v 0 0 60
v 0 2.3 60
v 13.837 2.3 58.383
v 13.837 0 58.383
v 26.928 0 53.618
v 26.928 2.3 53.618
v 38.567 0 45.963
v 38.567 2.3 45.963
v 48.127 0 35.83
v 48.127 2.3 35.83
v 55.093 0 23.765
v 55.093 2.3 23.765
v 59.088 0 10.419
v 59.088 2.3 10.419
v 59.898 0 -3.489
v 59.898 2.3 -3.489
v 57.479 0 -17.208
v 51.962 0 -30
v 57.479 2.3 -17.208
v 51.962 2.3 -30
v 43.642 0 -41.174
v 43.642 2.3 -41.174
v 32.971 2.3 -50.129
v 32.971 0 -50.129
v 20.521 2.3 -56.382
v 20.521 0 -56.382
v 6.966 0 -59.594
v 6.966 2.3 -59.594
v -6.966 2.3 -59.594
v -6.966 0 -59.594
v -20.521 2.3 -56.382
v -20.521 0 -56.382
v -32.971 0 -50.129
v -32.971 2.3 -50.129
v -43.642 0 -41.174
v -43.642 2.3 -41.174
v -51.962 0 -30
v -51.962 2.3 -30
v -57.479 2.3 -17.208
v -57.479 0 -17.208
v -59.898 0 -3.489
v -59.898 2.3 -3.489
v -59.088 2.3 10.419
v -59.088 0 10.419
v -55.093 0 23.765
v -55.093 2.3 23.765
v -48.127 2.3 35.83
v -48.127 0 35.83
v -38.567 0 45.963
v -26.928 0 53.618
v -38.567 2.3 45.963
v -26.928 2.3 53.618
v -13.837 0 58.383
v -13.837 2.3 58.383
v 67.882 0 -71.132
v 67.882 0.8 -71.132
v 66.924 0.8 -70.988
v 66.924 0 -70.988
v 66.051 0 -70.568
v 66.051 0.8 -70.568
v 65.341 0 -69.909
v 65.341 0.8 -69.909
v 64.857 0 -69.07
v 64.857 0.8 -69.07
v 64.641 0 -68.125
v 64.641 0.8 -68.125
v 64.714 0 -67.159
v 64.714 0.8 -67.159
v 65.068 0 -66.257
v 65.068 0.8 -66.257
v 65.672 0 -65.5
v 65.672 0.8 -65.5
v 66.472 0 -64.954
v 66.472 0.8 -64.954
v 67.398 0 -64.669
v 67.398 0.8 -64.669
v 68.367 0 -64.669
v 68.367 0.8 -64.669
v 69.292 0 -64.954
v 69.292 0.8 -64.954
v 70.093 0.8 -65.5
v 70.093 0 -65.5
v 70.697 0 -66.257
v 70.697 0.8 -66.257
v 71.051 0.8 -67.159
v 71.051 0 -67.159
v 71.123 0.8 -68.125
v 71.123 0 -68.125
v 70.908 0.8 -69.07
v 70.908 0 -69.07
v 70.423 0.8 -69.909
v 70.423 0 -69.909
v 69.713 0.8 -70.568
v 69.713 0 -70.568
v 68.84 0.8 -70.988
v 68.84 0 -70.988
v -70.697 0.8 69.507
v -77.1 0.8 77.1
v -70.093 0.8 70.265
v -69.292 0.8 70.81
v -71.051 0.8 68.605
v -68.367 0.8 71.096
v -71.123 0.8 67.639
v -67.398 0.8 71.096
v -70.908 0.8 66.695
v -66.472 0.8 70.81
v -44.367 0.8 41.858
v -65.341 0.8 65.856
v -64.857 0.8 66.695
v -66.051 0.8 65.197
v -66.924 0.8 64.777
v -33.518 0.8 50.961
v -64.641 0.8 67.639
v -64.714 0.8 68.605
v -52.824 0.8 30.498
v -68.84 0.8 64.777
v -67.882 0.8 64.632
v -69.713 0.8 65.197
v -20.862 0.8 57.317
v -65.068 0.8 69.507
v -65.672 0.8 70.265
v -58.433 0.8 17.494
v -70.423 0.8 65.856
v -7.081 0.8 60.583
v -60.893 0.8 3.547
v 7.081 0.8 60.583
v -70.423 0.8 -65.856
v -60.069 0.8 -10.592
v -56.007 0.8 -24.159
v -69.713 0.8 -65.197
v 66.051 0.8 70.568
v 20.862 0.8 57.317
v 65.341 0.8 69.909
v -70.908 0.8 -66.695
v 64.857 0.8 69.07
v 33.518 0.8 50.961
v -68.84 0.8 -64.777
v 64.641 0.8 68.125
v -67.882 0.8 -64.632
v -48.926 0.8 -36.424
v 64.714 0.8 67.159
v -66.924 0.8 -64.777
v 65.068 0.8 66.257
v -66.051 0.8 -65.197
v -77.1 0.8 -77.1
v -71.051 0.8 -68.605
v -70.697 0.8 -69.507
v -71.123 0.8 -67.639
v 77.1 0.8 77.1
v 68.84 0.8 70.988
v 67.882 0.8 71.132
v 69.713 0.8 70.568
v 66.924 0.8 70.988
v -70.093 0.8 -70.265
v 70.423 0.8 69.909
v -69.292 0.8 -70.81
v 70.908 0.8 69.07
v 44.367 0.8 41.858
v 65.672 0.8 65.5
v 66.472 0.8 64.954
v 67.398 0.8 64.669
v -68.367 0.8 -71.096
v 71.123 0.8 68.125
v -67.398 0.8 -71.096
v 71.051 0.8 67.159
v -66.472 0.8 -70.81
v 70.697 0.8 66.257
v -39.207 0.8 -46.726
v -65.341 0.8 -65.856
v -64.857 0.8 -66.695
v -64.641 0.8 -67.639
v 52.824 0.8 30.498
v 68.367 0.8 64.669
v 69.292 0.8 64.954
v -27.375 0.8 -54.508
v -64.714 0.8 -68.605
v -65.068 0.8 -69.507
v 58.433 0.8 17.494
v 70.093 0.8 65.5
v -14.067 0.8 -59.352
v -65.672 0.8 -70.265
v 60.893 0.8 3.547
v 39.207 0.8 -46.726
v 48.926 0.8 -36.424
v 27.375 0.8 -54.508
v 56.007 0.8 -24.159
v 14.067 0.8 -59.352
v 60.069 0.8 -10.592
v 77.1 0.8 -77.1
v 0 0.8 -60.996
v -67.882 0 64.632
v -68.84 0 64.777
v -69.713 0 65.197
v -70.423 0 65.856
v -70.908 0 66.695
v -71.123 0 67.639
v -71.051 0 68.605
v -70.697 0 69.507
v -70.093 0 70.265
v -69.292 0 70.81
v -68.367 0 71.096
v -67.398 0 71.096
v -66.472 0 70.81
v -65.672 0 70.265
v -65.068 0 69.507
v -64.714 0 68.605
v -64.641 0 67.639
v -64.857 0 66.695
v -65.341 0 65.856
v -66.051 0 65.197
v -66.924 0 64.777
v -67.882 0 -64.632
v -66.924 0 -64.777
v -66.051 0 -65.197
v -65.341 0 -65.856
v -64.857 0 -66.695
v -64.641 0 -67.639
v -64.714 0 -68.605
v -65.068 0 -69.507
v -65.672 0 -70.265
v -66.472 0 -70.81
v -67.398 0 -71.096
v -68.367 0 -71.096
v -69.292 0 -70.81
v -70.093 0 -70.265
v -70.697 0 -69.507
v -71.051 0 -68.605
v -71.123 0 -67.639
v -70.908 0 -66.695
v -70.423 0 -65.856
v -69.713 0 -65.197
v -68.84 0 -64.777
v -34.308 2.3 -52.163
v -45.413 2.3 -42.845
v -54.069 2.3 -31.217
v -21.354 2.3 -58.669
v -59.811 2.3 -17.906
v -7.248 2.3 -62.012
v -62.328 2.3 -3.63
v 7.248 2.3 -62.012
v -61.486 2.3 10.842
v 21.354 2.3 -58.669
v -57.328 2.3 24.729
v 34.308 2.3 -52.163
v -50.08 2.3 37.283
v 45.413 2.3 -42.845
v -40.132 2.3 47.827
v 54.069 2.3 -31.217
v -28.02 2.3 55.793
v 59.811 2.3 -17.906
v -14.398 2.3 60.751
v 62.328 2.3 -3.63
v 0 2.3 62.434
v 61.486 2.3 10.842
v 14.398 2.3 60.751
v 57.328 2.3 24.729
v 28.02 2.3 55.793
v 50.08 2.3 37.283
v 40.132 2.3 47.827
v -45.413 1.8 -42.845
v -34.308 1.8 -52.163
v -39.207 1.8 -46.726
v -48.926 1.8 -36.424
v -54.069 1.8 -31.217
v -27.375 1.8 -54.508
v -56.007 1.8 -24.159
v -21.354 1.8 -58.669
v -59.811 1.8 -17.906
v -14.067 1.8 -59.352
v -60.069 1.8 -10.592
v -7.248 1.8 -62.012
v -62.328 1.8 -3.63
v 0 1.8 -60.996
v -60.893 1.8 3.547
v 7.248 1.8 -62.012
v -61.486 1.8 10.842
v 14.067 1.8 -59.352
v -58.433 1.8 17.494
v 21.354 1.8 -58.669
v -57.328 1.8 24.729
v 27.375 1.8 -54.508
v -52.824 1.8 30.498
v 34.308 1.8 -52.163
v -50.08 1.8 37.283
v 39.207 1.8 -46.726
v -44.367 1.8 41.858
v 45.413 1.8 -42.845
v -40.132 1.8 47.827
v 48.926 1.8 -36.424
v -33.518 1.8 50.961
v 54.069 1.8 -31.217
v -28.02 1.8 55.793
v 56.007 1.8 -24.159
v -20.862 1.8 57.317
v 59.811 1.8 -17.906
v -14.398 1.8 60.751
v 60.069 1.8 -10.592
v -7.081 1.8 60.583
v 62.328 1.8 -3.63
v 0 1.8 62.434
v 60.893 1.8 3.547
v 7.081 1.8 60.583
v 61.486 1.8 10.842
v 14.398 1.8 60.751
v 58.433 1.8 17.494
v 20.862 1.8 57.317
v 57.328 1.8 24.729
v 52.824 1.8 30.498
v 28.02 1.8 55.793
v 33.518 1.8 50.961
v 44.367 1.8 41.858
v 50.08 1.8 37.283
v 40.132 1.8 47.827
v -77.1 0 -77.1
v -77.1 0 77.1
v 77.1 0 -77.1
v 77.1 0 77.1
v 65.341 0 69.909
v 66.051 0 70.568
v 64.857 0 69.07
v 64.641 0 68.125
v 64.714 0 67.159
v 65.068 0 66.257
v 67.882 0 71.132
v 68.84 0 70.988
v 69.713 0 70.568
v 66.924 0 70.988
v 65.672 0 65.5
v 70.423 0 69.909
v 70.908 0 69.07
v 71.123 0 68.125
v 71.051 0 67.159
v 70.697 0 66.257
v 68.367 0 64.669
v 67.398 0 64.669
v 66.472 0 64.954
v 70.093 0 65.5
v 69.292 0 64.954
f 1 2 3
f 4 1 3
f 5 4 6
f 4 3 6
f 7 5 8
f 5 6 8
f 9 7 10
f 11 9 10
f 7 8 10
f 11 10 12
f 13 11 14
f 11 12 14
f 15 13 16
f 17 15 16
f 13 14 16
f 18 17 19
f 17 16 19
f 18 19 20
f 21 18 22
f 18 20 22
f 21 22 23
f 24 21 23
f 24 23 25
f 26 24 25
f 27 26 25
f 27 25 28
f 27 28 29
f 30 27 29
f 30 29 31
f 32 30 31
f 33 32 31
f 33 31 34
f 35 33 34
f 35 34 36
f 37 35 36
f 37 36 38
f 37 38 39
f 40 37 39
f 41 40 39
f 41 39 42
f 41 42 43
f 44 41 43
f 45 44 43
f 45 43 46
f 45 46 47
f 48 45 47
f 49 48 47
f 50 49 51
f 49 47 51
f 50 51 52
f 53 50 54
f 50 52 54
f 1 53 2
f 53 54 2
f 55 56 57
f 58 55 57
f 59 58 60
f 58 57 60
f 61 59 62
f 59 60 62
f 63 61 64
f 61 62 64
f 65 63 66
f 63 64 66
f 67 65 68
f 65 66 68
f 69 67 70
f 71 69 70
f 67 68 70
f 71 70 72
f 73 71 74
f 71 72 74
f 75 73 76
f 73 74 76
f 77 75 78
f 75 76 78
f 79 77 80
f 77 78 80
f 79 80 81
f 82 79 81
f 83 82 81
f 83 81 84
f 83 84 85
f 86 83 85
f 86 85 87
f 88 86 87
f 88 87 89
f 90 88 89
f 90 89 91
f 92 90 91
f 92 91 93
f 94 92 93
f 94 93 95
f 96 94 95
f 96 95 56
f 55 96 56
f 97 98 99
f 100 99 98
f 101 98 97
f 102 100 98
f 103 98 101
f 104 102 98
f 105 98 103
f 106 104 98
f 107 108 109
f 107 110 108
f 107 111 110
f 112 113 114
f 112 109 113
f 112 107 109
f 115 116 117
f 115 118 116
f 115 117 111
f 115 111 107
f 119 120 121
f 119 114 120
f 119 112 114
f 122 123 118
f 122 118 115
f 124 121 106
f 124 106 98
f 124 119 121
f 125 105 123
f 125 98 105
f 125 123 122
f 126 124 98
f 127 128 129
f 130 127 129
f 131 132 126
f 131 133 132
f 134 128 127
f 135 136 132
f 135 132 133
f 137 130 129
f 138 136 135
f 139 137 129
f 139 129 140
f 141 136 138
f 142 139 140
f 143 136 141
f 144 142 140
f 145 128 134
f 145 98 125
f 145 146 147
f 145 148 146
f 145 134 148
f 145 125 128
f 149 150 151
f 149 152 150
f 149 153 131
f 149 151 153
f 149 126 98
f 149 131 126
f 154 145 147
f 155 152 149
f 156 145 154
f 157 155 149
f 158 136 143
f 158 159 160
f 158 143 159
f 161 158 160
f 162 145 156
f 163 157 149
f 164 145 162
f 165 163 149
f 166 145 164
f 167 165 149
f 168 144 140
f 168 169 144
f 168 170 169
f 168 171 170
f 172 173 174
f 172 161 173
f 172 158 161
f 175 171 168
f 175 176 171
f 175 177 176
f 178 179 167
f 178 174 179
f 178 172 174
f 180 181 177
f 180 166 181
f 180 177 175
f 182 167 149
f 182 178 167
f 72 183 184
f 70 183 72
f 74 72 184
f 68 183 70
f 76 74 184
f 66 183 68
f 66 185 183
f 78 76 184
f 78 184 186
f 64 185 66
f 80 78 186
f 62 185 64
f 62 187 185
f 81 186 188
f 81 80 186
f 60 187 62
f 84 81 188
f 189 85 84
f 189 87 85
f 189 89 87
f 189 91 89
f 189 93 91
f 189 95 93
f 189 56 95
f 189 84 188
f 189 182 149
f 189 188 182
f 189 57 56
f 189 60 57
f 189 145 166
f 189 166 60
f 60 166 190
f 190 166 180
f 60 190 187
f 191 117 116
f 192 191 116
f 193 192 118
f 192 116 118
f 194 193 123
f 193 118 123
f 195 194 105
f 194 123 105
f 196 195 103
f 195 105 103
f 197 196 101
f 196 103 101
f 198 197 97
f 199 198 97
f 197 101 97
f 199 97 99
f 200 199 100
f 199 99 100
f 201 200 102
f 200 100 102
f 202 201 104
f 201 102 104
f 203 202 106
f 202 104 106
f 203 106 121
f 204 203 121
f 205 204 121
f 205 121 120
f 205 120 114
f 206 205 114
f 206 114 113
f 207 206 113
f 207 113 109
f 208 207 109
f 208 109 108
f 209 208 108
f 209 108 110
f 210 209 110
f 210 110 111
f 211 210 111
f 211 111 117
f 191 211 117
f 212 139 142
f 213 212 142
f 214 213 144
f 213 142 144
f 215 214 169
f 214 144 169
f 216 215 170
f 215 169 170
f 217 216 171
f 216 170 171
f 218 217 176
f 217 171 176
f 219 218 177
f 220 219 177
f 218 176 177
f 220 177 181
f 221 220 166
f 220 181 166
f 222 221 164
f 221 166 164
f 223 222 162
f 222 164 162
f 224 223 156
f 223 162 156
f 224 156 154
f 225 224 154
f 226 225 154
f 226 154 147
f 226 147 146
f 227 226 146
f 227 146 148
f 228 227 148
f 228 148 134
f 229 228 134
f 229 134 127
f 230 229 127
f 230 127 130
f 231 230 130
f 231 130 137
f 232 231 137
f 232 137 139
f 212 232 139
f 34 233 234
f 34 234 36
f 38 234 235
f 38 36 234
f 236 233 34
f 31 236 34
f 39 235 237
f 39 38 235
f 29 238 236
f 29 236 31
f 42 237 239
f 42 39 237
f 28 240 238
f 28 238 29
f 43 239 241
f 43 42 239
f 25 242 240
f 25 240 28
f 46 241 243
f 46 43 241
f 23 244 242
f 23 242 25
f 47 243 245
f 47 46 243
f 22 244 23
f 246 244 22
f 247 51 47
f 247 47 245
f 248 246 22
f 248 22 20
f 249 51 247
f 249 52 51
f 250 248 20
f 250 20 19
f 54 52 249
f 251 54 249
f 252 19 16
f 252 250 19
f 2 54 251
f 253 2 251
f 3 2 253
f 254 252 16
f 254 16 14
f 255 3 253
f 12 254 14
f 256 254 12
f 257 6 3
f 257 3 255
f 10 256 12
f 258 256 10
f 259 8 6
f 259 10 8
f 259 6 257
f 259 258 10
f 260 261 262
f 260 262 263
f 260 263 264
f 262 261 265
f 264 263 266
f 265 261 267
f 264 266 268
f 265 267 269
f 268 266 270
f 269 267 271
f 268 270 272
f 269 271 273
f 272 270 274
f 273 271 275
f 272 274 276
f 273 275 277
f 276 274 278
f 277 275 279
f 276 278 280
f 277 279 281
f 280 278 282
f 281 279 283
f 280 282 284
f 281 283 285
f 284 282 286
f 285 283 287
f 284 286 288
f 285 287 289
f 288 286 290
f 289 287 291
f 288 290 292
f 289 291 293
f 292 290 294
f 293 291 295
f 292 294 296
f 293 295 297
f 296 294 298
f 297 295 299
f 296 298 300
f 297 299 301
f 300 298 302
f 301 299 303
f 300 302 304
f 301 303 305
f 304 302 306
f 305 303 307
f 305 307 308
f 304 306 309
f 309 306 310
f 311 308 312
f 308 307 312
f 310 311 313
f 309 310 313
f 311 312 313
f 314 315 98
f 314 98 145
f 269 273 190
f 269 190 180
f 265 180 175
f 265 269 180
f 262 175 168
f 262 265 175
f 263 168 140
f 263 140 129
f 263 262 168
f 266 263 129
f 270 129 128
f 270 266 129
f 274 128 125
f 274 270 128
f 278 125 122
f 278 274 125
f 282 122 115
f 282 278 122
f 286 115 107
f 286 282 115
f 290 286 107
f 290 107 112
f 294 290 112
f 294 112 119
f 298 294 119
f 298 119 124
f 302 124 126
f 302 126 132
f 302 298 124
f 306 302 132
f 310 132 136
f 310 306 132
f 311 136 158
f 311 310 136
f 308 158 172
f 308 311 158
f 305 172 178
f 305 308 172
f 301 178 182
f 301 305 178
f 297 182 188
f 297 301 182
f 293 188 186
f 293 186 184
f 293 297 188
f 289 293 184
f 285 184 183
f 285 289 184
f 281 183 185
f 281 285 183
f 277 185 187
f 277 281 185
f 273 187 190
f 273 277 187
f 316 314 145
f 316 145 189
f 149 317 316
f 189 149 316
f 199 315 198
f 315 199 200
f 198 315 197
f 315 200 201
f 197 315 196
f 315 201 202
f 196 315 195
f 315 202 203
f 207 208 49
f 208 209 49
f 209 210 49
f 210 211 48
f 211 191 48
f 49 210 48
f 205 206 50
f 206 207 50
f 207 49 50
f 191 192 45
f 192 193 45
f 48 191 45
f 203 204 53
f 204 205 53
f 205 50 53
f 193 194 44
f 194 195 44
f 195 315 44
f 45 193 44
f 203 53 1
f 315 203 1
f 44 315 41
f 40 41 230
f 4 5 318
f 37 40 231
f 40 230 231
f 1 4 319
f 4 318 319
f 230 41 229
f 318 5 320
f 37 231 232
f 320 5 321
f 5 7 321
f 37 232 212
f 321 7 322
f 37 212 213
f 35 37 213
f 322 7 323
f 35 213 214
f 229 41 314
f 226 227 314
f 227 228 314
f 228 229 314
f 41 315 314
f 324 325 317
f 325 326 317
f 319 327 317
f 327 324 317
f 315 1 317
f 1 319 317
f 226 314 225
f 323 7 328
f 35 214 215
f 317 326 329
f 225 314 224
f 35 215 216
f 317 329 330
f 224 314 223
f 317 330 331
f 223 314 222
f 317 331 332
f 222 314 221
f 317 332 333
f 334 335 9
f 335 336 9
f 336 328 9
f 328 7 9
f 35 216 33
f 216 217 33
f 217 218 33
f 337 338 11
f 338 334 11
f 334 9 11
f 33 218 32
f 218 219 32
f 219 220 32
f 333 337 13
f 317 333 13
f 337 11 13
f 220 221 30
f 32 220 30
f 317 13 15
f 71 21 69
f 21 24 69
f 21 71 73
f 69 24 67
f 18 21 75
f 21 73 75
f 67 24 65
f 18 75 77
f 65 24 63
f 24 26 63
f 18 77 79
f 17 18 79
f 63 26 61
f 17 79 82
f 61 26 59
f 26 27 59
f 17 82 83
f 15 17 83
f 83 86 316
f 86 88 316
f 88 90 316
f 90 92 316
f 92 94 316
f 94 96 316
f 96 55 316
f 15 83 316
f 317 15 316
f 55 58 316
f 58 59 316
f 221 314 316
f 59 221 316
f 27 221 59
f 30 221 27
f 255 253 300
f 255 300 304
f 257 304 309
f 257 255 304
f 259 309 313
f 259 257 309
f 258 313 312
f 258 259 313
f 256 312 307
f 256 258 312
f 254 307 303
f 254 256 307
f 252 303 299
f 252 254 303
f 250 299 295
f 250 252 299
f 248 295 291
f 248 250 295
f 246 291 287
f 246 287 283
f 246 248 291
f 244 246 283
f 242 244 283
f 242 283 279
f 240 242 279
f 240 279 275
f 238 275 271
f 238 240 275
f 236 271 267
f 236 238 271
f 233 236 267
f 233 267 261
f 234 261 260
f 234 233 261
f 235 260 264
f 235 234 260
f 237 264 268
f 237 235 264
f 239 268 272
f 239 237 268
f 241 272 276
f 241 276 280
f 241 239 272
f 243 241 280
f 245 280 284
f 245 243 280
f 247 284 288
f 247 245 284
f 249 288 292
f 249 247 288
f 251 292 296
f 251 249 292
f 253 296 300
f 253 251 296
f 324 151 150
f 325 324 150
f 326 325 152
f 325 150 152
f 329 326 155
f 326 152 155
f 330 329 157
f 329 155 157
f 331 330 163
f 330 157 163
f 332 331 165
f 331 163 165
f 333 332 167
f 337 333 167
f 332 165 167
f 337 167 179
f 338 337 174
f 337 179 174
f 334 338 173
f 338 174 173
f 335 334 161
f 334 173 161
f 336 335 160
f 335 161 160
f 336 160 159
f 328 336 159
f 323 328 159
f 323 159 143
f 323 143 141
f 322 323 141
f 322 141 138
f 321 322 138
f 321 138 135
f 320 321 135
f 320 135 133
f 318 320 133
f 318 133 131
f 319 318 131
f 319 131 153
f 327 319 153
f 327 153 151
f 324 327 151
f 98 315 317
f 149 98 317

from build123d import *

# Parameters (mm, degrees)
CROQUIS1_W              = 154.2
CROQUIS1_H              = 154.2
SALIENTE_EXTRUIR1_DEPTH = 0.8
CROQUIS2_R              = 60
CORTAR_EXTRUIR1_DEPTH   = 110.038800434
SALIENTE_EXTRUIR2_START = 1
CROQUIS3_R              = 60.995810587
CROQUIS3_R_2            = 60
SALIENTE_EXTRUIR2_DEPTH = 1
SALIENTE_EXTRUIR3_START = 0.5
CROQUIS4_R              = 62.434019261
CROQUIS4_R_2            = 60
SALIENTE_EXTRUIR3_DEPTH = 0.5
CROQUIS5_R              = 3.25
CORTAR_EXTRUIR2_DEPTH   = 110.046182877


with BuildPart() as part:
    # Croquis1 → Saliente-Extruir1 (new body)
    with BuildSketch(Plane(origin=(0, 0, 0), x_dir=(1, 0, 0), z_dir=(0, 1, 0))):
        Rectangle(CROQUIS1_W, CROQUIS1_H)
    extrude(amount=SALIENTE_EXTRUIR1_DEPTH)

    # Croquis2 → Cortar-Extruir1 (cut, through all)
    with BuildSketch(Plane(origin=(0, 0.8, 0), x_dir=(1, 0, 0), z_dir=(0, 1, 0))):
        with Locations(Location((0, 0, 0), (0, 0, 270))):
            Circle(CROQUIS2_R)
    extrude(amount=-CORTAR_EXTRUIR1_DEPTH, mode=Mode.SUBTRACT)

    # Croquis3 → Saliente-Extruir2 (add)
    with BuildSketch(Plane(origin=(0, 0.8, 0), x_dir=(1, 0, 0), z_dir=(0, 1, 0)).offset(SALIENTE_EXTRUIR2_START)):
        with Locations(Location((0, 0, 0), (0, 0, 90))):
            Circle(CROQUIS3_R)
        with Locations(Location((0, 0, 0), (0, 0, 270))):
            Circle(CROQUIS3_R_2, mode=Mode.SUBTRACT)
    extrude(amount=-SALIENTE_EXTRUIR2_DEPTH)

    # Croquis4 → Saliente-Extruir3 (add)
    with BuildSketch(Plane(origin=(0, 1.8, 0), x_dir=(1, 0, 0), z_dir=(0, 1, 0)).offset(SALIENTE_EXTRUIR3_START)):
        with Locations(Location((0, 0, 0), (0, 0, 270))):
            Circle(CROQUIS4_R)
        with Locations(Location((0, 0, 0), (0, 0, 270))):
            Circle(CROQUIS4_R_2, mode=Mode.SUBTRACT)
    extrude(amount=-SALIENTE_EXTRUIR3_DEPTH)

    # Croquis5 → Cortar-Extruir2 (cut, through all)
    with BuildSketch(Plane(origin=(0, 0.8, 0), x_dir=(1, 0, 0), z_dir=(0, 1, 0))):
        with Locations(Location((-67.882250994, 67.882250994, 0), (0, 0, 270))):
            Circle(CROQUIS5_R)
        with Locations(Location((67.882250994, 67.882250994, 0), (0, 0, 90))):
            Circle(CROQUIS5_R)
        with Locations(Location((-67.882250994, -67.882250994, 0), (0, 0, 90))):
            Circle(CROQUIS5_R)
        with Locations(Location((67.882250994, -67.882250994, 0), (0, 0, 270))):
            Circle(CROQUIS5_R)
    extrude(amount=-CORTAR_EXTRUIR2_DEPTH, mode=Mode.SUBTRACT)


solid = part.part
